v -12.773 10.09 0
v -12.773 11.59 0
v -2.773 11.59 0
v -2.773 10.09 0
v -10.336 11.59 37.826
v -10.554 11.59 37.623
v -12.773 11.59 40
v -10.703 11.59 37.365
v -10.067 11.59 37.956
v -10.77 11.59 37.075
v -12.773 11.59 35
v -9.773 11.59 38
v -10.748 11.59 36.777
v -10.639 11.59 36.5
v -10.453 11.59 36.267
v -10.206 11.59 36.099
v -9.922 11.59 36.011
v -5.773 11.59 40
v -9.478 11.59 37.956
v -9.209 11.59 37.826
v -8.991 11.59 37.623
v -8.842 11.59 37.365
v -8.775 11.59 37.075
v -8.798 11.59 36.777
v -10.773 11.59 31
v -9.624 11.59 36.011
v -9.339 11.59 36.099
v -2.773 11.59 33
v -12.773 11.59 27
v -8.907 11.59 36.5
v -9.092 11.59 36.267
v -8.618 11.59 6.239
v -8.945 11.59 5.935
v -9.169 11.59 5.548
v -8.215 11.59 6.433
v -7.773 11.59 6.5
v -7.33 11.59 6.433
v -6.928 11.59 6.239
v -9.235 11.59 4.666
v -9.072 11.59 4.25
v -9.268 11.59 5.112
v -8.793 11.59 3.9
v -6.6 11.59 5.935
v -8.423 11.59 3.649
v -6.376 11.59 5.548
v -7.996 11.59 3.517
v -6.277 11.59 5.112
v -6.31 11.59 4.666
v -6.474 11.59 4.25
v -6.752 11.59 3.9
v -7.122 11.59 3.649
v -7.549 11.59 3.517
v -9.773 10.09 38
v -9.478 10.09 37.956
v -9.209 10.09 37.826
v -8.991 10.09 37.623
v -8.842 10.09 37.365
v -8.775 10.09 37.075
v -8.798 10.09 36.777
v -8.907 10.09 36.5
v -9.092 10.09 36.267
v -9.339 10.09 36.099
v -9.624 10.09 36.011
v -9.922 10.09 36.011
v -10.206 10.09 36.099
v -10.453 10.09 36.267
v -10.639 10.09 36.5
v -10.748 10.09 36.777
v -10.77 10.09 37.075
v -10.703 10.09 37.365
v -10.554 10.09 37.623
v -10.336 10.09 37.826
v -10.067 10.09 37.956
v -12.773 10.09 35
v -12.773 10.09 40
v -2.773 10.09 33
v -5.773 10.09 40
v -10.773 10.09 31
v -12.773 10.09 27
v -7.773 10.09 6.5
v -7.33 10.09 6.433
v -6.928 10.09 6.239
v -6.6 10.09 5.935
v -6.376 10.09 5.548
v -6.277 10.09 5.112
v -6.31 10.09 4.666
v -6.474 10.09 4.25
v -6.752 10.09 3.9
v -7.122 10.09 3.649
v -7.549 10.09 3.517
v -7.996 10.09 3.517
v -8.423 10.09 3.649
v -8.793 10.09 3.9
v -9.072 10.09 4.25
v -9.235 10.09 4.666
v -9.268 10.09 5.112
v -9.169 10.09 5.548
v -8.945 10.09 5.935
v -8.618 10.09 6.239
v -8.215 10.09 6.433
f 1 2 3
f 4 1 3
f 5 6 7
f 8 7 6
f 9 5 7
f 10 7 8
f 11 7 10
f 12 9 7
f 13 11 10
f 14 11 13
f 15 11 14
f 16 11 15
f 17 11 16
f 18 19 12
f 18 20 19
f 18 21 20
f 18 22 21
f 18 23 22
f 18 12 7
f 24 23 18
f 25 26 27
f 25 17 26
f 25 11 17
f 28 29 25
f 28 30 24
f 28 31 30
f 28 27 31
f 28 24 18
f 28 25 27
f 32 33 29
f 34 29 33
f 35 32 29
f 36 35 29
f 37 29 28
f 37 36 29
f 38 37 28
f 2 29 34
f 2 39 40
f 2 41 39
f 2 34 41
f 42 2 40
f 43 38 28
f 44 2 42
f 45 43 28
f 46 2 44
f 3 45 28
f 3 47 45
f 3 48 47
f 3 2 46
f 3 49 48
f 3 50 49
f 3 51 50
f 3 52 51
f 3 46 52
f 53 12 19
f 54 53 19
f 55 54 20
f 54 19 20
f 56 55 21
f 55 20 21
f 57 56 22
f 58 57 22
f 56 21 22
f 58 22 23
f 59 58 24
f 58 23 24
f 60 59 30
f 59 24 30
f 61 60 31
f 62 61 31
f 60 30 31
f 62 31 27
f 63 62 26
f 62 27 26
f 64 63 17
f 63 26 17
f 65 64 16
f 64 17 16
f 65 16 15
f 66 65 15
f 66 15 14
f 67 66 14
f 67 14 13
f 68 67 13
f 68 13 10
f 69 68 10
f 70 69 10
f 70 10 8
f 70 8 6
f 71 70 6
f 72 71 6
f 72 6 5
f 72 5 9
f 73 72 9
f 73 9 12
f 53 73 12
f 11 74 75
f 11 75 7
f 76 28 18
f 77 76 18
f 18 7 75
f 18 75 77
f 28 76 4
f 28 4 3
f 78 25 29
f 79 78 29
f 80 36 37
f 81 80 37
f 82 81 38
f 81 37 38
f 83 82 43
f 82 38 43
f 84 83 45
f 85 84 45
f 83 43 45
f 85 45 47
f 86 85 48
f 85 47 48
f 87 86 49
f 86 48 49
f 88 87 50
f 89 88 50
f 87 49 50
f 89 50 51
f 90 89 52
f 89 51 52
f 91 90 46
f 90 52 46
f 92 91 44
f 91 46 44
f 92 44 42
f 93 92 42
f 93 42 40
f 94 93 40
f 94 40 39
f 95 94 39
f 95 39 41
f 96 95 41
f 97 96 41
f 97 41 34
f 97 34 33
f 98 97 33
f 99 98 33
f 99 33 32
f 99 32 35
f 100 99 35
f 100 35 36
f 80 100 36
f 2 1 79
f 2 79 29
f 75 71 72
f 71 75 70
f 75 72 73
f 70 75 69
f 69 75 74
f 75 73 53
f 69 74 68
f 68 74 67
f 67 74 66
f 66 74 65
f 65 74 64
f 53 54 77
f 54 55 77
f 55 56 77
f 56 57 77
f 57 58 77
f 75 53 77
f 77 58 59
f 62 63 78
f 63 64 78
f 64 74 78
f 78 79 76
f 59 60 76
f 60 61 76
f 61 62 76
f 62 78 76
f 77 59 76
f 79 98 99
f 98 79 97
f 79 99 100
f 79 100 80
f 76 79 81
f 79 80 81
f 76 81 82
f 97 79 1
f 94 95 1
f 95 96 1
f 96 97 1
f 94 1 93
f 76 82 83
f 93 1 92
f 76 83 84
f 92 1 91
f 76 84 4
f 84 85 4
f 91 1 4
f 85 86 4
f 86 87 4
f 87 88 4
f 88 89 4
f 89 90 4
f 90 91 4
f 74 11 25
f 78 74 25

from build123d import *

# Parameters (mm, degrees)
ESQUISSE1_W      = 10
ESQUISSE1_H      = 1.5
EXTRUSION1_DEPTH = 40
ESQUISSE2_R      = 1
ESQUISSE2_R_2    = 1.5
EXTRUSION2_DEPTH = 50


with BuildPart() as part:
    # Esquisse1 → Extrusion1 (new body)
    with BuildSketch(Plane.XY):
        with Locations((-7.772581117, 10.840421053)):
            Rectangle(ESQUISSE1_W, ESQUISSE1_H)
    extrude(amount=EXTRUSION1_DEPTH)

    # Esquisse2 → Extrusion2 (cut)
    with BuildSketch(Plane(origin=(0, 11.590421053, 0), x_dir=(-1, 0, 0), z_dir=(0, 1, 0))):
        with Locations(Location((9.772581117, 37, 0), (0, 0, 90))):
            Circle(ESQUISSE2_R)
        with Locations(Location((7.772581117, 5, 0), (0, 0, 90))):
            Circle(ESQUISSE2_R_2)
        Polygon((12.772581117, 35), (10.772581117, 31), (12.772581117, 27), align=None)
        Polygon((5.772581117, 40), (2.772581117, 40), (2.772581117, 33), align=None)
    extrude(amount=-EXTRUSION2_DEPTH, mode=Mode.SUBTRACT)


solid = part.part
